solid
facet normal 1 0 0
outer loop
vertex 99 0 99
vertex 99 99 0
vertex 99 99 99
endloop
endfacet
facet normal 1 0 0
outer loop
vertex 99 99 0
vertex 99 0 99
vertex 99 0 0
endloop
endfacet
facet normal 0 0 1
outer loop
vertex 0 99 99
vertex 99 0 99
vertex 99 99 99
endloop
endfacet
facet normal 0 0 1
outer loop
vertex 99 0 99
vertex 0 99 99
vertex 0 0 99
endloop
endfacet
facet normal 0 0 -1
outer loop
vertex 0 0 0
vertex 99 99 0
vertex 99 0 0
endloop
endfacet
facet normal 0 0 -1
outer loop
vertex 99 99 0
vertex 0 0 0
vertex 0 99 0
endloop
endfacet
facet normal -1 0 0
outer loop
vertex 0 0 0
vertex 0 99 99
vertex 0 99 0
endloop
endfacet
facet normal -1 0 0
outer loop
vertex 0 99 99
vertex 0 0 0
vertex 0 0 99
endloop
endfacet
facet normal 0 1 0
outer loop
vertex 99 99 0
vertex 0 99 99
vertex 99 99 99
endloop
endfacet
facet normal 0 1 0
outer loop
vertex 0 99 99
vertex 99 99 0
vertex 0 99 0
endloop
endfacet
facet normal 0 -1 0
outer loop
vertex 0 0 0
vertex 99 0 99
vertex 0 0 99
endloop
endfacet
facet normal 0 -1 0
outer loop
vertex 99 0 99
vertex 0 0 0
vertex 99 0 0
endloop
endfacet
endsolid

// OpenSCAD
/* [Hidden] */
WALL = 2;
module box() cube(WALL);
cube(99);
box();
